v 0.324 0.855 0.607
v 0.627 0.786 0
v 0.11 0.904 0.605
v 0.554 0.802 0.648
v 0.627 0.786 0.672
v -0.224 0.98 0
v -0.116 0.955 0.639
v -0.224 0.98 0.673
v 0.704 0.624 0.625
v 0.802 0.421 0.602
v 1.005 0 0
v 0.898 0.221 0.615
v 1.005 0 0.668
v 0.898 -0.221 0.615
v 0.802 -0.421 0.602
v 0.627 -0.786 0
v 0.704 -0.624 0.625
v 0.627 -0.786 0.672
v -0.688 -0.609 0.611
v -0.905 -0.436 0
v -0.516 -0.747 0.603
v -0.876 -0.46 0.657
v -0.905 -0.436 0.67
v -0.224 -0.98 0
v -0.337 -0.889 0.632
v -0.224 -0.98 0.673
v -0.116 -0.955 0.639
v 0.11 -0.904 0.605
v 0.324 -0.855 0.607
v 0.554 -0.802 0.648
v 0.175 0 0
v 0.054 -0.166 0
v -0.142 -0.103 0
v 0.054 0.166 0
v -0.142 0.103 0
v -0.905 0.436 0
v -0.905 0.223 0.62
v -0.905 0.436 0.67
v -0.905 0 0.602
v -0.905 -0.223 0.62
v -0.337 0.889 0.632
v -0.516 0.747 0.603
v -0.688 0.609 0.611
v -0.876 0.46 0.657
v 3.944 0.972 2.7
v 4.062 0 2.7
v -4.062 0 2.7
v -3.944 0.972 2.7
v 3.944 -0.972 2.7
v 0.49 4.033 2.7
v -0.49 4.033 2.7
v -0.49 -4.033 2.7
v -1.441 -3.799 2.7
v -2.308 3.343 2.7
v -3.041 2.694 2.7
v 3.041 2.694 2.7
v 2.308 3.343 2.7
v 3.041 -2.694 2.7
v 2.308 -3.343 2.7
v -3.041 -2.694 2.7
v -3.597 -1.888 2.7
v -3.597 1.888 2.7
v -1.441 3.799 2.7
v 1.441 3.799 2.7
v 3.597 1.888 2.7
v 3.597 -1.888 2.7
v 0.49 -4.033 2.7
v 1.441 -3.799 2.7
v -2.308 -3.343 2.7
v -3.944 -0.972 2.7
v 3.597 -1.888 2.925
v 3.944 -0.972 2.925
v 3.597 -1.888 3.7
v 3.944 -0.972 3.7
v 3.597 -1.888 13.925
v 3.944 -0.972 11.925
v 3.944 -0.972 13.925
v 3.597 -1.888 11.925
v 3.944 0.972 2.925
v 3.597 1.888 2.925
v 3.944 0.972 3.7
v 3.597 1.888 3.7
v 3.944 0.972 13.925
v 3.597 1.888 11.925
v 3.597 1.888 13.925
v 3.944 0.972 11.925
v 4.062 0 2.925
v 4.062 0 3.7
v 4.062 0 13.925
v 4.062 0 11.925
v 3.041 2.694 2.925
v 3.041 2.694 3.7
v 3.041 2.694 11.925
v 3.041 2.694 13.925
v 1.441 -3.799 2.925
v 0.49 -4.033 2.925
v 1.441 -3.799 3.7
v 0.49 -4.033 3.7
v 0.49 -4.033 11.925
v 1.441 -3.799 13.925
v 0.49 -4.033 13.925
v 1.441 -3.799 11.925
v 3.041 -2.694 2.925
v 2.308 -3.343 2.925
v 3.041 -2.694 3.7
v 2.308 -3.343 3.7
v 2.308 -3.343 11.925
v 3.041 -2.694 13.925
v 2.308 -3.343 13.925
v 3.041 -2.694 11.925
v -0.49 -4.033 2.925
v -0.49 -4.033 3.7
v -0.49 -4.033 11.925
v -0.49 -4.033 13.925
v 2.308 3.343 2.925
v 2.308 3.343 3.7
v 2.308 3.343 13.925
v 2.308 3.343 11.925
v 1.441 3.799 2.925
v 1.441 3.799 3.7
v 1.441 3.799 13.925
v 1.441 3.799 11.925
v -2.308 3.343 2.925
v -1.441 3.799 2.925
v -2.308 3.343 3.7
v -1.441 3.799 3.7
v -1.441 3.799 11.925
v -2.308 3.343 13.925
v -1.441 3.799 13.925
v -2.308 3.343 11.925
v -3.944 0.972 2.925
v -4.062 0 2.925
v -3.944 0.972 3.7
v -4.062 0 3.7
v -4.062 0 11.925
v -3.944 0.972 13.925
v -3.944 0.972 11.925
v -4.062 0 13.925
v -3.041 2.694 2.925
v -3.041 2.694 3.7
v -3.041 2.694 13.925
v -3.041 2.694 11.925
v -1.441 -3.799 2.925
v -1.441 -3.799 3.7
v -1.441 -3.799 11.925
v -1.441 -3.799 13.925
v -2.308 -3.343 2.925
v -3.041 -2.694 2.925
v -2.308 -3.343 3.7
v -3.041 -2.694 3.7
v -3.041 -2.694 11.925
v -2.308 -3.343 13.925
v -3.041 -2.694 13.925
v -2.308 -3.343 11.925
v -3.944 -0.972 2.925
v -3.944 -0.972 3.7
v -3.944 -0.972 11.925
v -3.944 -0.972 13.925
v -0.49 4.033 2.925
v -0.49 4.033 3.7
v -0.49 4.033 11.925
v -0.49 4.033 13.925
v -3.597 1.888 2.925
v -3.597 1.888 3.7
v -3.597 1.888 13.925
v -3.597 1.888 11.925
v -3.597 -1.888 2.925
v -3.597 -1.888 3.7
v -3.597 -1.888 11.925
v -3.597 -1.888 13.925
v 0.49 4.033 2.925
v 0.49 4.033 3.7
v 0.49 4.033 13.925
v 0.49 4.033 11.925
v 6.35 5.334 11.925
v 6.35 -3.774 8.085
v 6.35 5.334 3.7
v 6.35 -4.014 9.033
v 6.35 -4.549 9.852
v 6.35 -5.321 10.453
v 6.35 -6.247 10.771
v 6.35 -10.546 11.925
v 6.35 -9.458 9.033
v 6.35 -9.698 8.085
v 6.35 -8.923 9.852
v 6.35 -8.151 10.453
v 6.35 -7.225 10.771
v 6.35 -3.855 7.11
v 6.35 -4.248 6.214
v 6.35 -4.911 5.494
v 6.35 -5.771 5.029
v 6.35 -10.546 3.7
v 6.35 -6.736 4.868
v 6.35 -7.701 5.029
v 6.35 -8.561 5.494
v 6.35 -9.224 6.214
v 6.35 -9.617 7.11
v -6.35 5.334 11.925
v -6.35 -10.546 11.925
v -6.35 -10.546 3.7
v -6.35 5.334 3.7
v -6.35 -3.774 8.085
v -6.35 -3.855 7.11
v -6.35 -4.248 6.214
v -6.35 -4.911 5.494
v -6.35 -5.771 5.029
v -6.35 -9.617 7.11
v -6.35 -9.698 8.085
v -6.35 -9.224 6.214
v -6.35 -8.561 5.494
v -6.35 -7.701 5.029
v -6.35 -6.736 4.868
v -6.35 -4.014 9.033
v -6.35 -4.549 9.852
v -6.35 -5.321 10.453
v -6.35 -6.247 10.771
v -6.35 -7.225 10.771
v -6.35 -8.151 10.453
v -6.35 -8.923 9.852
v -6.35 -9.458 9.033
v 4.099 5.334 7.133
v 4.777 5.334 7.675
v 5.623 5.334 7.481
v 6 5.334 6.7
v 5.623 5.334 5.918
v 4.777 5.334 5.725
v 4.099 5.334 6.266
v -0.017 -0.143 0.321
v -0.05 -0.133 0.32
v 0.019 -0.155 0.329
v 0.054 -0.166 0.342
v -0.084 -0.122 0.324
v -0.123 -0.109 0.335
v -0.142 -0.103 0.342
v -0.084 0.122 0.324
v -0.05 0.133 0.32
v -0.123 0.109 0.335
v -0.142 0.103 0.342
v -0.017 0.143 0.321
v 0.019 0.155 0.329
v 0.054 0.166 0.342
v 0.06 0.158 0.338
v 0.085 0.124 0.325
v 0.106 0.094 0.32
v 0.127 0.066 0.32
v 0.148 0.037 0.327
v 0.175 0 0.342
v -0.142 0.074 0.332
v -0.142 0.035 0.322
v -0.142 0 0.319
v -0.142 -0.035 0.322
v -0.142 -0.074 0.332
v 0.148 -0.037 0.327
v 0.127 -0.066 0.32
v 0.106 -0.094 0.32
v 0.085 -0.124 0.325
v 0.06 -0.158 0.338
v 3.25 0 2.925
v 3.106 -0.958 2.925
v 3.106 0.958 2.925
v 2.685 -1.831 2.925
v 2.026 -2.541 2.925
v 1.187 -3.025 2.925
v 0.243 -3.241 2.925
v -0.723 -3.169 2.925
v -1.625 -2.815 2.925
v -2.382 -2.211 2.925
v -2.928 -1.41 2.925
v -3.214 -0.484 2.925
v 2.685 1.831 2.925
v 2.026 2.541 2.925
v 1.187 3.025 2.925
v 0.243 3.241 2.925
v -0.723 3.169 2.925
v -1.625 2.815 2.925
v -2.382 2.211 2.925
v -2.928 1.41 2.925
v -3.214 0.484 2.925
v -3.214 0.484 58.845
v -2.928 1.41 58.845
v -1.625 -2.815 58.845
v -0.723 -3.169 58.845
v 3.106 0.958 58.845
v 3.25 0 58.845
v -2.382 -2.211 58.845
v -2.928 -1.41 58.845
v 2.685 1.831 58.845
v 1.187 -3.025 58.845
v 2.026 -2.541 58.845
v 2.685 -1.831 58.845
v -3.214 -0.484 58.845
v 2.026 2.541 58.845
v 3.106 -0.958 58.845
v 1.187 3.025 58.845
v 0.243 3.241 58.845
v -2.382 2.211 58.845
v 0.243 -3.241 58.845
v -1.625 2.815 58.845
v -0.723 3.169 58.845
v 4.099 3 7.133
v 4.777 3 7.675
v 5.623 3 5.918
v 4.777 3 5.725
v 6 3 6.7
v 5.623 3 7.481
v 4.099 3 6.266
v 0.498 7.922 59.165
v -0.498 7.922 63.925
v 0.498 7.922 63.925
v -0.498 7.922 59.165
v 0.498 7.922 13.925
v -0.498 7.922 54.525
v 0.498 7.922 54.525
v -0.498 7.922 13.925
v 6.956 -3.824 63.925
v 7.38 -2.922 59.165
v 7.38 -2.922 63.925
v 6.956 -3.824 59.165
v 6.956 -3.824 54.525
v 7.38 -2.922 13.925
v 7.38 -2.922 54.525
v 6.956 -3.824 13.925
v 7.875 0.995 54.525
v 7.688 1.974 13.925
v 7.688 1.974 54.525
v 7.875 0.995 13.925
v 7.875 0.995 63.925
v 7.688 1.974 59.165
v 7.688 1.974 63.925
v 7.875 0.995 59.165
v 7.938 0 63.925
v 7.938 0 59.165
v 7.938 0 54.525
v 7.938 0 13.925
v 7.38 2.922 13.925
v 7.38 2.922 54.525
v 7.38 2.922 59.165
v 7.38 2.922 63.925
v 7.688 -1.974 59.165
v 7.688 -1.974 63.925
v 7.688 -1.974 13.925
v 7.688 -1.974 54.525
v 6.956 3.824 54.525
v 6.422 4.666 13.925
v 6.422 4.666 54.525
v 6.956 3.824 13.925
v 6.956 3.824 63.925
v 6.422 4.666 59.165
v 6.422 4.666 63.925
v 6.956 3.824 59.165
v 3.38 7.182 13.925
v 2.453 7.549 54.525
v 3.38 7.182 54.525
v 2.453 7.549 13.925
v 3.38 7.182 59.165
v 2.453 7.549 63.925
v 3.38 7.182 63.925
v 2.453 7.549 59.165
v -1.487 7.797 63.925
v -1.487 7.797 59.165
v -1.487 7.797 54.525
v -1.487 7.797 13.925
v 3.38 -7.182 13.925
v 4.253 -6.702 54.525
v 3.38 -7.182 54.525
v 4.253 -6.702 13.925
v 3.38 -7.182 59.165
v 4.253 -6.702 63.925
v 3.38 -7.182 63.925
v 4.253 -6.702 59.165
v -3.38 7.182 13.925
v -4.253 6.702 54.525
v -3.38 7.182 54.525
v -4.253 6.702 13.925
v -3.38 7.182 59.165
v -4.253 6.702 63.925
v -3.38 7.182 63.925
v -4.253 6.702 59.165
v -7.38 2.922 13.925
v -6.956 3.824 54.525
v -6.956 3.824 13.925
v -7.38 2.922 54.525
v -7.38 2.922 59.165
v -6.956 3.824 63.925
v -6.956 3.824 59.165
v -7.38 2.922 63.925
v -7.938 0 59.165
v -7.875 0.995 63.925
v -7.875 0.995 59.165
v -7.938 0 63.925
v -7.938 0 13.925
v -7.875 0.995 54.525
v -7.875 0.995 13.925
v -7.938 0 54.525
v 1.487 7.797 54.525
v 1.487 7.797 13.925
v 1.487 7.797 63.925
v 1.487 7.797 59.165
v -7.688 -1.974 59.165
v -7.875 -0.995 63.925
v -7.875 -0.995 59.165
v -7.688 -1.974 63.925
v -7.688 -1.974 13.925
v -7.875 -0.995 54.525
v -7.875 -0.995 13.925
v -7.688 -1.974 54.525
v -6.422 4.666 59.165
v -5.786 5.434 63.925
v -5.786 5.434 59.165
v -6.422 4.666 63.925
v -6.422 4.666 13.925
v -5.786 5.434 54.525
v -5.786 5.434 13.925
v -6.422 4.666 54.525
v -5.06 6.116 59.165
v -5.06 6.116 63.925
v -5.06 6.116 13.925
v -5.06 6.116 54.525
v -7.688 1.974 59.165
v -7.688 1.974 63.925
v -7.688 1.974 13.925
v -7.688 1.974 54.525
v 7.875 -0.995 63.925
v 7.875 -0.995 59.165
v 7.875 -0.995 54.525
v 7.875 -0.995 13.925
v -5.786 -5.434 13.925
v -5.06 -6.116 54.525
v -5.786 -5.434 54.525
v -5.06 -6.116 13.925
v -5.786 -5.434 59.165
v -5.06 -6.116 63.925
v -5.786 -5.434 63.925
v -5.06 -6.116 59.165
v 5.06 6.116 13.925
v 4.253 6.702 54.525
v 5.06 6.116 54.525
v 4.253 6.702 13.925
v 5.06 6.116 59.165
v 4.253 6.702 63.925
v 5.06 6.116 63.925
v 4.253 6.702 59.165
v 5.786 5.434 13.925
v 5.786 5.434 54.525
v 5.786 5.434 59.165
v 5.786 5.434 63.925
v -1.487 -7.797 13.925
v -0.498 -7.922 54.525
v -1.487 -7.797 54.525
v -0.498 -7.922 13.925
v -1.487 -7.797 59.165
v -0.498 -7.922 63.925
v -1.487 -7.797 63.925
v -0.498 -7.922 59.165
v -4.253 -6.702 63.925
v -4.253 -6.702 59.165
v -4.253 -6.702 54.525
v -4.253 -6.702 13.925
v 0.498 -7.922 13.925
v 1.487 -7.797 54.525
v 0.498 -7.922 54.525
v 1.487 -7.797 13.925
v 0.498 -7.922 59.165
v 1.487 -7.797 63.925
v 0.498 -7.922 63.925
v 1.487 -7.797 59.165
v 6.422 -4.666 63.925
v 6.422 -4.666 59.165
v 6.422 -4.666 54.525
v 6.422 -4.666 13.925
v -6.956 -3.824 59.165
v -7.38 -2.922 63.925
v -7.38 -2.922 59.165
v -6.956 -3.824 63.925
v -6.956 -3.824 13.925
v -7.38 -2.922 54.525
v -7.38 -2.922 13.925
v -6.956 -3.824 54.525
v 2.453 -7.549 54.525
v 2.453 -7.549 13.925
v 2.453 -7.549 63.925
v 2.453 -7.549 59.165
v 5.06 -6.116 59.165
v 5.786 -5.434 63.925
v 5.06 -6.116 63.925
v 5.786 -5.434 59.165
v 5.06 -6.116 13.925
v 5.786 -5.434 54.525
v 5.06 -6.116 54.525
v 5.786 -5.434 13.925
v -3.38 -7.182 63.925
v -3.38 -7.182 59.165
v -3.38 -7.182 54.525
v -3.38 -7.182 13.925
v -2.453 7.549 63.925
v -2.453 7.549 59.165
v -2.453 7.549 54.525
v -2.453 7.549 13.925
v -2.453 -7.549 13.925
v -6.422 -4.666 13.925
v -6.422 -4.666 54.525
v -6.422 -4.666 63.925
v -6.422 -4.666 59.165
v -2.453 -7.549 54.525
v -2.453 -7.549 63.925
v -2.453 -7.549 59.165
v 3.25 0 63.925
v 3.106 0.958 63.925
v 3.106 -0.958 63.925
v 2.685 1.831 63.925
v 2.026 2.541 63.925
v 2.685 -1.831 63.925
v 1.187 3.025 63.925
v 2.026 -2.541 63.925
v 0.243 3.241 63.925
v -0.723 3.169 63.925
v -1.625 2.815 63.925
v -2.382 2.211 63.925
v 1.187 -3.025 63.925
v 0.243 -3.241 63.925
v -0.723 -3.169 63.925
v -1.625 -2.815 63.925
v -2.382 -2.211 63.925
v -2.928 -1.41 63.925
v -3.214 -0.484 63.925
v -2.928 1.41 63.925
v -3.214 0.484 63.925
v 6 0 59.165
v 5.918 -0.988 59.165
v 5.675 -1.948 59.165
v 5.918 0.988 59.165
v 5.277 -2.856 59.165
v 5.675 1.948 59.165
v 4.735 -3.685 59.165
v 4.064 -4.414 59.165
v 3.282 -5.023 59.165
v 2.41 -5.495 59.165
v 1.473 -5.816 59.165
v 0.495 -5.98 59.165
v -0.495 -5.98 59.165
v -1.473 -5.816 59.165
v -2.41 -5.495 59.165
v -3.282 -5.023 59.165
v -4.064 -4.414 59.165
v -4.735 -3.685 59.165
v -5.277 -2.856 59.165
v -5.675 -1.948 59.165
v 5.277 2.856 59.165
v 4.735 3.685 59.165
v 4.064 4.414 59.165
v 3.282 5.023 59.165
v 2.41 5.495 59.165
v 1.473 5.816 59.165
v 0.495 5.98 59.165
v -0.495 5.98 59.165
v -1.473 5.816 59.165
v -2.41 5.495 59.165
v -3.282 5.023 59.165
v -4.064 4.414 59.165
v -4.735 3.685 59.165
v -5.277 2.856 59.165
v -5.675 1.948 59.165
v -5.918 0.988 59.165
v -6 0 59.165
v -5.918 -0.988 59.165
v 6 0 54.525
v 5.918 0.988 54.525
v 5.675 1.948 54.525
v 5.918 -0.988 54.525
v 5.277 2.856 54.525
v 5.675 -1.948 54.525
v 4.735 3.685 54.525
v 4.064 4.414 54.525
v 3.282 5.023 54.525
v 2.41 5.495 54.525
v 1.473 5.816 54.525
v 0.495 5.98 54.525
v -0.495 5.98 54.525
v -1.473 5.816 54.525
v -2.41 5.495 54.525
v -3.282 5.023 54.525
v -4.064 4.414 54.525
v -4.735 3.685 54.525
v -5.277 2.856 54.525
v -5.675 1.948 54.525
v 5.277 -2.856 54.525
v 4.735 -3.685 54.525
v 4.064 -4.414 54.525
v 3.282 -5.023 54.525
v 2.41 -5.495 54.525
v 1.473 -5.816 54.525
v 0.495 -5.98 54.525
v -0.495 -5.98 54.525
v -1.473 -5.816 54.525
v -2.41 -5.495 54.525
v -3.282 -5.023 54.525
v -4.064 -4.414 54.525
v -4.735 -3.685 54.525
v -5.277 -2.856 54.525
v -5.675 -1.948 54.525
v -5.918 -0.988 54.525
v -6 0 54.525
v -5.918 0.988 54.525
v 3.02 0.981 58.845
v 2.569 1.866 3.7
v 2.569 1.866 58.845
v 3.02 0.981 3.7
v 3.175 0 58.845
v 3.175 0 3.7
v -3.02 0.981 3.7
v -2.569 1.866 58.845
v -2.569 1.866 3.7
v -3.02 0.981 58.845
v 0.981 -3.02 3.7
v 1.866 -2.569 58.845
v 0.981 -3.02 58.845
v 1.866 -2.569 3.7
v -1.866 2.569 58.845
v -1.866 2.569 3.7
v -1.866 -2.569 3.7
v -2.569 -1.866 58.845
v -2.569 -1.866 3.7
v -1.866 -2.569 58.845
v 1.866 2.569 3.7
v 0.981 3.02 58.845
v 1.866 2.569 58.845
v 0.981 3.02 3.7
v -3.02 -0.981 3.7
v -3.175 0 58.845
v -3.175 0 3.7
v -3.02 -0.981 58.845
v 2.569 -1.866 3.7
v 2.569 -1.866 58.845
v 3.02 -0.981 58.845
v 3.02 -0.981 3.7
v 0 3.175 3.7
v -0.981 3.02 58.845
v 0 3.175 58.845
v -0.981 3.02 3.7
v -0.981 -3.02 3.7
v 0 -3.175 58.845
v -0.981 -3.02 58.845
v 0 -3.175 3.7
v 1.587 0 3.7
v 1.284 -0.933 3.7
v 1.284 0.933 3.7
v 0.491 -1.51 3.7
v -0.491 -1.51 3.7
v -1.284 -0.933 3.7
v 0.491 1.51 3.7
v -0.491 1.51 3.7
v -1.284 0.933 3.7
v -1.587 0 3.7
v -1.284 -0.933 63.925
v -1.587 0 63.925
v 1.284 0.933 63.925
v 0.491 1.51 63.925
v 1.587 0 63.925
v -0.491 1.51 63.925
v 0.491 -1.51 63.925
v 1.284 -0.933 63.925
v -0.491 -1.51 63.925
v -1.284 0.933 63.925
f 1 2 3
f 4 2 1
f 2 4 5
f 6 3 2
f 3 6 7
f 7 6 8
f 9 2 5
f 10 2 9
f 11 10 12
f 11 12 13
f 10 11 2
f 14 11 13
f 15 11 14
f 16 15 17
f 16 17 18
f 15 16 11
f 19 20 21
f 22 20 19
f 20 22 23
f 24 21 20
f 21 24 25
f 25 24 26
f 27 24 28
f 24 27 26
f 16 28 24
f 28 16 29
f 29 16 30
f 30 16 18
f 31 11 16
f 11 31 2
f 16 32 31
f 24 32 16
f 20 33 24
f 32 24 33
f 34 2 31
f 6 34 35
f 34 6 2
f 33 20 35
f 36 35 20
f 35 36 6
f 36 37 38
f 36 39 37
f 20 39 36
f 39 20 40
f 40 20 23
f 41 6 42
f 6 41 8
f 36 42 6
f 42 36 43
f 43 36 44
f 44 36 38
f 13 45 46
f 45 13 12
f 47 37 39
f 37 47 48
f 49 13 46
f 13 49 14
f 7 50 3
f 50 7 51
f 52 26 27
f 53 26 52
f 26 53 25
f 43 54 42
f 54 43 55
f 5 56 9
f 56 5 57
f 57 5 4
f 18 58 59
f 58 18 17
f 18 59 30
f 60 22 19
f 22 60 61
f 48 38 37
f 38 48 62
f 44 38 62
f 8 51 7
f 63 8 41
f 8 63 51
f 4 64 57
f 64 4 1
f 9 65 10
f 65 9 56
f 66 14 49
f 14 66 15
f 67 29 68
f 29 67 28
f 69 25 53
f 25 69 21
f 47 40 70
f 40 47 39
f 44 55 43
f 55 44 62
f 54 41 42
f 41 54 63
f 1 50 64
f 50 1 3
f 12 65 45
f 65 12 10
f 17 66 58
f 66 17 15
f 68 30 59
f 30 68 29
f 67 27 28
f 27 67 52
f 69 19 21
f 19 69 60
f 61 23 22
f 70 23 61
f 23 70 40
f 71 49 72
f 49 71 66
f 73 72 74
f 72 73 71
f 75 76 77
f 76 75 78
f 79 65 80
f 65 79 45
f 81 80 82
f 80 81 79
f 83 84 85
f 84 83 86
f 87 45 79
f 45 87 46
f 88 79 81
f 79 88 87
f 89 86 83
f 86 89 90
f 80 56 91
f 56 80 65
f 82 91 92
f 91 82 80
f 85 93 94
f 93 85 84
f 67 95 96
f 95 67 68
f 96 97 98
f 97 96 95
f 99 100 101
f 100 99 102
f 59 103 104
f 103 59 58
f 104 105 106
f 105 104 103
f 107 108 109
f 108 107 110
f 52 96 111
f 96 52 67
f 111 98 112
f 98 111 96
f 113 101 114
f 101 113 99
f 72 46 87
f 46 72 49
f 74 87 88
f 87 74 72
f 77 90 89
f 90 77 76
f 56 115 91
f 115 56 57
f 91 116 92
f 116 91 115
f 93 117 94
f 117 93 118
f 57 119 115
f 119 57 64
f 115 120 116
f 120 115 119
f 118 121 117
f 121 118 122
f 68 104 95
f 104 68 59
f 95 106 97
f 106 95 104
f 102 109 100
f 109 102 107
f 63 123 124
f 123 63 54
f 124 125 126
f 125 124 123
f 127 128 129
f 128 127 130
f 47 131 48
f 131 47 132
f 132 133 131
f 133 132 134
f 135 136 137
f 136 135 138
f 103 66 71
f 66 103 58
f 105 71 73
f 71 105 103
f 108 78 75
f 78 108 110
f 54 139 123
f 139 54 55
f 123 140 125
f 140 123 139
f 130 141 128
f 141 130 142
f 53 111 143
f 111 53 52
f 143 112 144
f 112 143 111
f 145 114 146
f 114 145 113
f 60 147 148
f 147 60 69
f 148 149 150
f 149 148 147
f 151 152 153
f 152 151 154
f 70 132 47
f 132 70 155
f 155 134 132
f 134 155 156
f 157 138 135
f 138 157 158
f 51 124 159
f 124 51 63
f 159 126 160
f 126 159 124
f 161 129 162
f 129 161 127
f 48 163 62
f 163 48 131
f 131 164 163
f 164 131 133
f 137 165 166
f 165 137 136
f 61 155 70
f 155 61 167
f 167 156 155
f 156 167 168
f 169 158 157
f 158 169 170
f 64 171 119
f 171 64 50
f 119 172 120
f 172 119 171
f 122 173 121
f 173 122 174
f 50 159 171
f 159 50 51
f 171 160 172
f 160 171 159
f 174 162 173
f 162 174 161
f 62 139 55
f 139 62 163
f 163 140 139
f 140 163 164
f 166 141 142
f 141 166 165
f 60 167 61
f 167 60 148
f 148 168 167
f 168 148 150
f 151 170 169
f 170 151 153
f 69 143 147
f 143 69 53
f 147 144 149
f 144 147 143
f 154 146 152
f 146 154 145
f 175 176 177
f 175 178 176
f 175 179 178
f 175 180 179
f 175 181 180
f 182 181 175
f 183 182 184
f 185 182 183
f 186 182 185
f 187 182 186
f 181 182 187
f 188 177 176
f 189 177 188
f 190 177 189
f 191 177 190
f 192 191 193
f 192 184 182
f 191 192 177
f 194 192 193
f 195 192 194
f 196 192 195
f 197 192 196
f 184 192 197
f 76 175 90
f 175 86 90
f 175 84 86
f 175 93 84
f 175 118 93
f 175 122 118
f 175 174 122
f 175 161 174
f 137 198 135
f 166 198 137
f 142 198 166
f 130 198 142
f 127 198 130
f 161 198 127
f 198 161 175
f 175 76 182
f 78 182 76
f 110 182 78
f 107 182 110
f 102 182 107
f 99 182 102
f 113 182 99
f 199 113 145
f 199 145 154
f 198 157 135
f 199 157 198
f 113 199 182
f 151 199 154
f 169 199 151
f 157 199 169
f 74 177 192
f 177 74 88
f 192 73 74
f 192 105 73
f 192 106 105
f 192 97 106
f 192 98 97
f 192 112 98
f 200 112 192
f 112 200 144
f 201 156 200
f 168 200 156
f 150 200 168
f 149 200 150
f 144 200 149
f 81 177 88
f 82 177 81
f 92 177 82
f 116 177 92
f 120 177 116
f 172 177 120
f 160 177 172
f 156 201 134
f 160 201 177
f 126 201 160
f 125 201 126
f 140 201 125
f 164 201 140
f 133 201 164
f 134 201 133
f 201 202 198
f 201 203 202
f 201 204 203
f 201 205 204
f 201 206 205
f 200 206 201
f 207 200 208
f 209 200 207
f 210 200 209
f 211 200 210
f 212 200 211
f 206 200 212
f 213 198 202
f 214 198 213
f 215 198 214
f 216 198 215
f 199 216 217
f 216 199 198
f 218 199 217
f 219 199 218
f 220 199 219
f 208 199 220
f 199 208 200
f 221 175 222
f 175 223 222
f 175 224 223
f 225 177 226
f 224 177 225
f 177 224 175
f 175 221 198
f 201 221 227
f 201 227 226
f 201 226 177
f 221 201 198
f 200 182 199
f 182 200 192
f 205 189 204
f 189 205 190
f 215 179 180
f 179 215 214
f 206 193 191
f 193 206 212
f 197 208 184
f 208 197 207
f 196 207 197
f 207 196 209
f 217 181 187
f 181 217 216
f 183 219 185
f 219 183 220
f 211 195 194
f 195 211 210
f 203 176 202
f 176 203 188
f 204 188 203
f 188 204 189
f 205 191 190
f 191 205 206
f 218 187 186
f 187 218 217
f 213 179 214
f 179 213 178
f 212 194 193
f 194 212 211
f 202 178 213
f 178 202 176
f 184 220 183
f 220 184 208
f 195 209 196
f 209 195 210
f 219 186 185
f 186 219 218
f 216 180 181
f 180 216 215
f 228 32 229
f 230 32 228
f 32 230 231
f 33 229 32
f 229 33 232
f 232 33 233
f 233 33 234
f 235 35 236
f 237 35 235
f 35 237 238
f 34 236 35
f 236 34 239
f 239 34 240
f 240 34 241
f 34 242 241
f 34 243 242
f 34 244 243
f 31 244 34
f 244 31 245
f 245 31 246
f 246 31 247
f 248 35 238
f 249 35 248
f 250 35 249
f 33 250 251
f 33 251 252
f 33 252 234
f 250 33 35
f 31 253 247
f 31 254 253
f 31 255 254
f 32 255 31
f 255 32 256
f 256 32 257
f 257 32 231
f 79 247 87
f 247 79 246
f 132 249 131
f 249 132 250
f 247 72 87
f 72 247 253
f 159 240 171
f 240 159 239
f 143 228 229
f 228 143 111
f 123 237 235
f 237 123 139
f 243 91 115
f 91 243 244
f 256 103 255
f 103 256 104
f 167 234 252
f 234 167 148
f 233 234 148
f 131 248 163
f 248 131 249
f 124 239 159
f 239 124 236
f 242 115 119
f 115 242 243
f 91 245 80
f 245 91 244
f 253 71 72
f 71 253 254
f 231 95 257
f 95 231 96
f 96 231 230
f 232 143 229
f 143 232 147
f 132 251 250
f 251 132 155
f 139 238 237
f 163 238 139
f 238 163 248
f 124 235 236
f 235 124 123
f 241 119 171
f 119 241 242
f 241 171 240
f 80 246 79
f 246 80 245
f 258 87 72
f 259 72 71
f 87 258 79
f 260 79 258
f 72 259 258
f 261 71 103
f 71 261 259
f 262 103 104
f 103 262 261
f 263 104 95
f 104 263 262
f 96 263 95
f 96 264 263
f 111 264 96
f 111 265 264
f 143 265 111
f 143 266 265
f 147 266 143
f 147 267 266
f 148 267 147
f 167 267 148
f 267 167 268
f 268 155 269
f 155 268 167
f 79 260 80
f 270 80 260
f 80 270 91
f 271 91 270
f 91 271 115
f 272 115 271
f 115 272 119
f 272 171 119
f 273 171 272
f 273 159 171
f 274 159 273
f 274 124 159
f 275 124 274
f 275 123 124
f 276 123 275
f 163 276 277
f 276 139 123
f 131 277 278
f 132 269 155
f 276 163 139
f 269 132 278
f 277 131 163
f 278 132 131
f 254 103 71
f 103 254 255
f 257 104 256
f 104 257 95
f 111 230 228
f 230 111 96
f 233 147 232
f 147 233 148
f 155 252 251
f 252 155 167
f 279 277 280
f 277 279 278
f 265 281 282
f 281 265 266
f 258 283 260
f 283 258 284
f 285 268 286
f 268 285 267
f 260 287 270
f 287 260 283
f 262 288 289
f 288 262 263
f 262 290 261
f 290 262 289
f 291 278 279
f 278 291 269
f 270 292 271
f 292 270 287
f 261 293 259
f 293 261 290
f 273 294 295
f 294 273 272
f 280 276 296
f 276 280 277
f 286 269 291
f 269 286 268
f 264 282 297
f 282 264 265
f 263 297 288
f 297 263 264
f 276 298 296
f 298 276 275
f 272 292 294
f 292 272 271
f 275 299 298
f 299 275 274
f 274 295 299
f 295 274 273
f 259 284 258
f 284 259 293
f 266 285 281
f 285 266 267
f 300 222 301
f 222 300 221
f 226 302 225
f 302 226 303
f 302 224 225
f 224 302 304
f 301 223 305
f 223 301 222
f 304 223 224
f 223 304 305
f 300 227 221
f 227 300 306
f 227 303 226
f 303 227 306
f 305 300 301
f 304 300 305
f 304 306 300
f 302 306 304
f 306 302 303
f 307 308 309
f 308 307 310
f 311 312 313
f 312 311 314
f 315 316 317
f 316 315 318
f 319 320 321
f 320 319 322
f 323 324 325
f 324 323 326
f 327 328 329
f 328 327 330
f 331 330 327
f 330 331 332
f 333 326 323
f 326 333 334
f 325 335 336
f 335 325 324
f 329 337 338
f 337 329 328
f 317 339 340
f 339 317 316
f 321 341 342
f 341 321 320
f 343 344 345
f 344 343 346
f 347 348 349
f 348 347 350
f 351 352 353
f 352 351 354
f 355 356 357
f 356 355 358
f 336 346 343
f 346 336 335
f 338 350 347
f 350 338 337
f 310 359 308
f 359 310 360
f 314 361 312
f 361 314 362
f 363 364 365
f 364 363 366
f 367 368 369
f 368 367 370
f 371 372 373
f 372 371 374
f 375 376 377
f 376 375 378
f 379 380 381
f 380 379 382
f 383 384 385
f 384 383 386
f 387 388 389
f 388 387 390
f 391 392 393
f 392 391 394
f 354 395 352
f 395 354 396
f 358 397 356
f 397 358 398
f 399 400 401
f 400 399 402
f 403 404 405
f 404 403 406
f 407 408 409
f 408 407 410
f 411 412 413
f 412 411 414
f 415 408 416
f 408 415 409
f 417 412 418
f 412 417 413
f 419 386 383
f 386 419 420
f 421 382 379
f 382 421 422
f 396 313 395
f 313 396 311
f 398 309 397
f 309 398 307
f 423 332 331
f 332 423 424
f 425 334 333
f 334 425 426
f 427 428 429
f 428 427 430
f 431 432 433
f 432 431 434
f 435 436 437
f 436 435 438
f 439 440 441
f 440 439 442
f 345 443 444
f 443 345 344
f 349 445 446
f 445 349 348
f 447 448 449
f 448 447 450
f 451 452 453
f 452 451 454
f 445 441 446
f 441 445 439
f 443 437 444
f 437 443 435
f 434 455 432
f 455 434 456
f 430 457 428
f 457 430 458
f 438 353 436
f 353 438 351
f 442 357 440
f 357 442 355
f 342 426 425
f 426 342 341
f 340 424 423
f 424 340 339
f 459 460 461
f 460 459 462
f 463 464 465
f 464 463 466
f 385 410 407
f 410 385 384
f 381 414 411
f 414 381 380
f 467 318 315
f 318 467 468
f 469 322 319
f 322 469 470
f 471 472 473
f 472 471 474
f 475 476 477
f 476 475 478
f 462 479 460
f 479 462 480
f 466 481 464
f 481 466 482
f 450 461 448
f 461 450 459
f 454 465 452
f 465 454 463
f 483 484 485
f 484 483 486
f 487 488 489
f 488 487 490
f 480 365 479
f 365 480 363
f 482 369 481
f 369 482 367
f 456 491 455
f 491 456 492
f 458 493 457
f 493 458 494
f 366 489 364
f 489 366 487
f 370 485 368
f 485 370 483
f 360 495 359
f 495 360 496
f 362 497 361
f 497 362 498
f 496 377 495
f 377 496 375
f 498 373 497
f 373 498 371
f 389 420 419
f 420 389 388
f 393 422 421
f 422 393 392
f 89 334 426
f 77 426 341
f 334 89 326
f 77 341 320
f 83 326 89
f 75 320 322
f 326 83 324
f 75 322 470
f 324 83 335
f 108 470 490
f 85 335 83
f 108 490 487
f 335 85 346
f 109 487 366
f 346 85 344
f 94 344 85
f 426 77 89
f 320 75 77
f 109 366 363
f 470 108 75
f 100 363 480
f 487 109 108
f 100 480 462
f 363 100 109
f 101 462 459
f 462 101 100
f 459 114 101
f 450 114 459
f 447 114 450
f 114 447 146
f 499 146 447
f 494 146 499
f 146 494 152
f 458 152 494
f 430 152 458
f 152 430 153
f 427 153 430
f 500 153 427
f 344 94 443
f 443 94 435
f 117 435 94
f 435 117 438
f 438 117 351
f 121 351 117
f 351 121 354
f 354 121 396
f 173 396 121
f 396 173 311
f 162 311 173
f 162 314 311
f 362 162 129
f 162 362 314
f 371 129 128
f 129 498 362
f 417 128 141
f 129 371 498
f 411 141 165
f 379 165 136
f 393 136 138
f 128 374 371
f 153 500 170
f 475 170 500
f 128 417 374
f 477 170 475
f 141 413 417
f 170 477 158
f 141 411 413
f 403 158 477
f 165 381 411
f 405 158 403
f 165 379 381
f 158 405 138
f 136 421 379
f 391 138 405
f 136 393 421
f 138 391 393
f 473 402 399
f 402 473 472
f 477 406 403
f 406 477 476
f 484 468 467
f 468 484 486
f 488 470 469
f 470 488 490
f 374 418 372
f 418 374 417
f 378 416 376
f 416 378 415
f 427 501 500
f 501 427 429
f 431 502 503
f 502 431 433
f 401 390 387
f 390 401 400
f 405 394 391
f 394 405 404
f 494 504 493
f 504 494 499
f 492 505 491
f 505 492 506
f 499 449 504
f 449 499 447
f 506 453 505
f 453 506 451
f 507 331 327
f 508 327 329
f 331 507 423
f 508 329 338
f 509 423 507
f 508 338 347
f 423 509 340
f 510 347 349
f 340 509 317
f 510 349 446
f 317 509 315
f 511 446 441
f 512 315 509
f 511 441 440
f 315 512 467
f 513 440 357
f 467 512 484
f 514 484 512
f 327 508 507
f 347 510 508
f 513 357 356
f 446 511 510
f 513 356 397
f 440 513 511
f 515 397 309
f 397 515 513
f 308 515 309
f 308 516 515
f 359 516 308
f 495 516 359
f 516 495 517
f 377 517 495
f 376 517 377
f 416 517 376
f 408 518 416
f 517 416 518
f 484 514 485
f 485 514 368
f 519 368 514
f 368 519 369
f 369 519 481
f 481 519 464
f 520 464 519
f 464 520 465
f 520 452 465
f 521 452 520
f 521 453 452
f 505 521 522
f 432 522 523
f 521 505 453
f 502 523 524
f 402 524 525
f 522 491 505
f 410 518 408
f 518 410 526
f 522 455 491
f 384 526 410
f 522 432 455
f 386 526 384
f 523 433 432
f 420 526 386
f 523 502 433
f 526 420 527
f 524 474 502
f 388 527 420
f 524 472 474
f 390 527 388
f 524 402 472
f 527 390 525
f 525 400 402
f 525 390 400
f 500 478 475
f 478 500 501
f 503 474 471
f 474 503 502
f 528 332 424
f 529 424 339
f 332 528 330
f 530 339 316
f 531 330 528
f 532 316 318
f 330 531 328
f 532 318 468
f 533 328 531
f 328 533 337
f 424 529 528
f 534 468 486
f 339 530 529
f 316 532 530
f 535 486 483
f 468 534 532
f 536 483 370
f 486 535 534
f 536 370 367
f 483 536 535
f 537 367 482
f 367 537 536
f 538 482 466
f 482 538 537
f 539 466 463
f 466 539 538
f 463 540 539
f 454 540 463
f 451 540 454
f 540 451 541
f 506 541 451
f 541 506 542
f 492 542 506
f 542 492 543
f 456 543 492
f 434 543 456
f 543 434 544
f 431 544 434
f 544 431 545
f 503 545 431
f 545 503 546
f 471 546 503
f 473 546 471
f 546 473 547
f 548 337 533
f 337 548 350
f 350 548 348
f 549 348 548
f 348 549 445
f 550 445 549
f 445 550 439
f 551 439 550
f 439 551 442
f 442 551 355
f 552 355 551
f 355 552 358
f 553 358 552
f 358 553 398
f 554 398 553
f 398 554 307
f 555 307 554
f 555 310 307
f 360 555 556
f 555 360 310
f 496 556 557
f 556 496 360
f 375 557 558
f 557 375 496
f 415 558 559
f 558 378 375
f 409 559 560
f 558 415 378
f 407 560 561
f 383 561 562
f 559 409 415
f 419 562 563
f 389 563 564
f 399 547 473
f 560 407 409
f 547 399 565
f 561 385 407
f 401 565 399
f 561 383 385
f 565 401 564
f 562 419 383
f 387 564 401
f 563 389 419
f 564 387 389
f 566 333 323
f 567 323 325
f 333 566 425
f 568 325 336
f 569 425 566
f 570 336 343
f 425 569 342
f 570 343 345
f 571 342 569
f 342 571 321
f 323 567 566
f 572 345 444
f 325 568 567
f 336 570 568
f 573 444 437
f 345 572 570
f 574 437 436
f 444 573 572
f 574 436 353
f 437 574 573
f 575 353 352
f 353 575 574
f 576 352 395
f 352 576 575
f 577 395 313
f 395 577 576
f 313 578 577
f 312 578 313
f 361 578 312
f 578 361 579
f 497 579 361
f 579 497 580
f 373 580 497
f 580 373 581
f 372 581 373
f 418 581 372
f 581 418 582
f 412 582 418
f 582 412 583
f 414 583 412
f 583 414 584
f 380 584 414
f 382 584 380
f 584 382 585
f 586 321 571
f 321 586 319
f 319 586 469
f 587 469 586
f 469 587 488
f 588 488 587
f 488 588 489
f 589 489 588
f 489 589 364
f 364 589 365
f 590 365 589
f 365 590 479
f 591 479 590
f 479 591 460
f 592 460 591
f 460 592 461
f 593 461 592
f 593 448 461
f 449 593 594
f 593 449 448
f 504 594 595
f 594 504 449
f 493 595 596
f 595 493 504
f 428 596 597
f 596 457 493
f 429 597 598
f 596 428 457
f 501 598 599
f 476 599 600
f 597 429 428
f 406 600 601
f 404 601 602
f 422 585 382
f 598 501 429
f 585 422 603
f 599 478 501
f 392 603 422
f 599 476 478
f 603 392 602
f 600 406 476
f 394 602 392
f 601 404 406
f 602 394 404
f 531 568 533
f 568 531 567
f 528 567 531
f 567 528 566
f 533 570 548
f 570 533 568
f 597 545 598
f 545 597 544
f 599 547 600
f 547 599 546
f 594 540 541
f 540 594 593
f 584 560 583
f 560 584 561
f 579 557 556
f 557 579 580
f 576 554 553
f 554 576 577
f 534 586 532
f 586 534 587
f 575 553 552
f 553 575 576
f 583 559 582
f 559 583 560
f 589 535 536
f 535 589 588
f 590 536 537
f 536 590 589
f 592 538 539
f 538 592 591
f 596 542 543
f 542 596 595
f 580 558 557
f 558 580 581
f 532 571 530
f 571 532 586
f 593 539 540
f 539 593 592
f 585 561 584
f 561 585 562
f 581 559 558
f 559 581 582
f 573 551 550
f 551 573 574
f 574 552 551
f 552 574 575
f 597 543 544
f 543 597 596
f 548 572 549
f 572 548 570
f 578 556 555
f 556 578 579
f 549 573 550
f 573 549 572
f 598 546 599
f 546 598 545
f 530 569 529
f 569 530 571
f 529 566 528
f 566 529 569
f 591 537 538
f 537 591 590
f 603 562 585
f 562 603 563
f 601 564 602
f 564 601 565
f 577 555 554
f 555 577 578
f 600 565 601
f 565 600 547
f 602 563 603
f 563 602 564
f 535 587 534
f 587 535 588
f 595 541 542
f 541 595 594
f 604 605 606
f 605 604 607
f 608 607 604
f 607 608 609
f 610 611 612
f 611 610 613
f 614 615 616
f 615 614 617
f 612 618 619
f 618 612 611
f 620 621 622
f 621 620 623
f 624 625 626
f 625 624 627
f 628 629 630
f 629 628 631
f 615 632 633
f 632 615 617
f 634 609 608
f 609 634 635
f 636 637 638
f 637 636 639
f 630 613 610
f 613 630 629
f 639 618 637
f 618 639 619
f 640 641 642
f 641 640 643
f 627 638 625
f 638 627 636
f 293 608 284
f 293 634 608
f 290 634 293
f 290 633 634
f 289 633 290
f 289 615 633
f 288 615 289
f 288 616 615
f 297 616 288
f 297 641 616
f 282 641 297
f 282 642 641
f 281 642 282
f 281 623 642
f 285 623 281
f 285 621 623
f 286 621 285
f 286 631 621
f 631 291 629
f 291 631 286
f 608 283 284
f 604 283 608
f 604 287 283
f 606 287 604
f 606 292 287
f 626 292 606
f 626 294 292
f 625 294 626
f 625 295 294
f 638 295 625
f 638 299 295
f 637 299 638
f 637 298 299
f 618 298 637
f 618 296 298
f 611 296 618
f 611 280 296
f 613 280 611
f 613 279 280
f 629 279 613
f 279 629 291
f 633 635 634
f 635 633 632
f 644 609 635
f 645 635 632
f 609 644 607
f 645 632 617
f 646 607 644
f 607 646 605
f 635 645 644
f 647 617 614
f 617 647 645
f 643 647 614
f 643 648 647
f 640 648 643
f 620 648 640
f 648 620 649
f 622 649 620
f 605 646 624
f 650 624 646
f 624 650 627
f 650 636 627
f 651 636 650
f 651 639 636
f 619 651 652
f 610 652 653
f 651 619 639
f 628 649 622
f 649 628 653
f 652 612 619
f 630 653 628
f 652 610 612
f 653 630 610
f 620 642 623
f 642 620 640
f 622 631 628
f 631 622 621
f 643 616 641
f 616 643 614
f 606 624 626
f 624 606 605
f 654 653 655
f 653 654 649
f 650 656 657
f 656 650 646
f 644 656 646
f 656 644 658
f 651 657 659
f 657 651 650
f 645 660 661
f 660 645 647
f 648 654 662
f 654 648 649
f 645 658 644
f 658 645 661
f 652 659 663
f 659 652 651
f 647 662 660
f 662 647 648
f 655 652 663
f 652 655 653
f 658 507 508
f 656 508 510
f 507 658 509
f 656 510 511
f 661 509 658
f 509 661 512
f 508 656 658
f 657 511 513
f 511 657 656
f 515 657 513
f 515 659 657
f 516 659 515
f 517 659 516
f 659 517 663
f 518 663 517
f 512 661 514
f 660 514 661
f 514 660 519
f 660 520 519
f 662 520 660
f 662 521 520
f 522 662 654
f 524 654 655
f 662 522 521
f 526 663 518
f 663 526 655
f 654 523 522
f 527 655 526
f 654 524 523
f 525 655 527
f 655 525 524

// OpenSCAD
// file: ../config.scad
/*
 * config
 *
 * Copyright 2013 <b@Zi.iS>
 * License CC BY 3.0
 */

$fa = 1;
$fs = 1;
preview = 1;

// preview colors
color_steal = [.8,.8,.8];
color_wood = [.3,.3,0];
color_print = [0,.8,0];

// metric bolt sizes
function m_hole(size) = size*1.1/2;
function m_pilot(size) = size*.9/2;

mounting_bolt = 3;

// slightly move and slightly elongate objects in preview to overcome scad rounding errors
module e() {
	if(preview==1) {
		translate([
			0,
			0,
			-.1
		]) {
			scale([
				1,
				1,
				1.1
			]) {
				child();
			}
		}
	} else {
		child();
	}
}

module m_washer(
	size = 3
) {
	color(color_steal) {
		difference() {
			cylinder(
				r = size/2*2,
				h = size*.2
			);
			e() cylinder(
				r = size/2,
				h = size*.2
			);
		}
	}
	translate([
		0,
		0,
		size*.2
	]) {
		child();
	}
}

module m_nut(
	size = 3
) {
	color(color_steal) {
		difference() {
			cylinder(
				r = size*1.8/2,
				h = size*.8,
				$fn = 6
			);
		}
	}
	translate([
		0,
		0,
		size*.8
	]) {
		child();
	}
}

module m_nylock(
	size = 3
) {
	color(color_steal) {
		difference() {
			cylinder(
				r = size*1.8/2,
				h = size,
				$fn = 6
			);
		}
	}
	translate([
		0,
		0,
		size
	]) {
		child();
	}
}

module screw(
	r = 1,
	h = 1,
	pitch = 5,
) {
	linear_extrude(
		height = h,
		twist = -h/pitch*360
	) {
		translate([pitch/5,0,0]) { //H=.2*p works better in plastic then ISO's H=.866*p
			circle(
				r=r 
			);
		}
	}
}

fan40 = [
	40,			//width/length
	10,			//height
	32,			//bolt pitch
	3,			//bolt
];

lm8uu = [
	15.2/2,	//outside
	8/2,	//inside
	26,		//length
];
// main file
/*
 * j-head
 *
 * Copyright Reifsnyderb, <b@Zi.iS>
 *
 * License GPLv2
 */

include <../config.scad>

jhead();

function jhead_mount() = [15.875, 4.76];

module jhead_mount_offset() {
	translate([
		0,
		0,
		-(50 + (8.125 - 2.01)/2 * sin(118) + 1 + 8.225 + 2) + 4.76
	]) {
		child(0);
	}
}

module jhead(
	nozzle_version = 4, // Not implemented!
	holder_version = 4, // Not implemented!
) {
	echo("J-Head Nozzle:", nozzle_version, " Holder:", holder_version);
	nozzle_length = (8.125 - 2.01)/2 * sin(118);

	color([.7,.7,0]) {
		difference() {
			union() {
				cylinder(
					r = 2.01/2,
					h = 26.035
				);
				cylinder(
					r1 = 0,
					r2 = 8.125/2,
					h = nozzle_length
				);
				translate([
					0,
					0,
					nozzle_length
				]) {
					cylinder(
						r = 8.125/2,
						h = 26.035 - nozzle_length
					);
				}
				translate([
					-12.7/2,
					-15.88+5.08+0.254,
					nozzle_length + 1
				]) {
					cube([
						12.7,
						15.88,
						8.225
					]);
				}
			}
			translate([
				-12.7/2 -1,
				-15.88+5.08+0.254 + 3.81,
				nozzle_length + 1 + 4.14,
			]) {
				rotate([
					0,
					90,
					0
				]) {
				cylinder(
						r = 5.944/2,
						h = 17
					);
				}
			}
			translate([
				0,
				0,
				-0.001
			]) {
				cylinder(
					r = 0.35/2,
					h = 30
				);
			}
			translate([
				0,
				0,
				26.035 - 23.11 - nozzle_length
			]) {
				cylinder(
					r1 = 0,
					r2 = 8.125/2,
					h = nozzle_length
				);
			}
		translate([
				0,
				0,
				26.035 - 23.11 -0.001
			]) {
				cylinder(
				r = 6.5/2,
					h = 26.035 - nozzle_length
				);
			}
			translate([
				5,
				3,
				nozzle_length + 1 + 3
		]) {
				rotate([
					-90,
					0,
					0,
				]) {
				cylinder(
						r = 2/2,
						h = 3
					);
				}
			}
		}
	}
	color([0,0,0]) {
		difference() {
			union() {
				translate([
					0,
					0,
					nozzle_length + 1 + 8.225 + 2,
				]) {
					difference() {
						cylinder(
							r = 15.875/2,
							h = 50
						);
						translate([
							0,
							0,
							50 - 4.76 - 4.64
						]) {
							cylinder(
								r = 100,
								h = 4.64
							);
						}
					}
					cylinder(
						r = 12/2,
						h = 50
					);
				}
			}
			translate([
				0,
				0,
				nozzle_length + 1 + 8.225 + 1,
			]) {
				cylinder(
					r = 6.5/2,
					h = 52
				);
			}
		}
	}
	
	//PTFE Liner
	color([.7,0,0]) {
		difference() {
			translate([
				0,
				0,
				nozzle_length + 1,
			]) {
				cylinder(
					r = 6.35/2,
					h = 8.225 + 2 + 50 -5.08 
				);
			}
			translate([
				0,
				0,
				nozzle_length ,
			]) {
				cylinder(
					r = 3.175/2,
					h =8.225 + 2 + 50 -5.08 + 2
				);
			}
		}
	}
	
	//Retaining screew
	color([0,0,0]) {
		difference() {
			translate([
				0,
				0,
				nozzle_length + 1 + 8.225 + 2 + 50 -5.08,
			]) {
				cylinder(
					r = 6.5/2,
					h = 5.08
				);
			}
			translate([
				0,
				0,
				nozzle_length + 1 + 8.225 + 2 + 50 -5.08 -.001,
			]) {
				cylinder(
					r = 3.175/2,
					h = 7
				);
			}
		}
	}
	translate([
		0,
		0,
		nozzle_length + 1 + 8.225 + 2 + 50- 4.76 - 4.64 //Origin at mount
	]) {
		child();
	}
}
